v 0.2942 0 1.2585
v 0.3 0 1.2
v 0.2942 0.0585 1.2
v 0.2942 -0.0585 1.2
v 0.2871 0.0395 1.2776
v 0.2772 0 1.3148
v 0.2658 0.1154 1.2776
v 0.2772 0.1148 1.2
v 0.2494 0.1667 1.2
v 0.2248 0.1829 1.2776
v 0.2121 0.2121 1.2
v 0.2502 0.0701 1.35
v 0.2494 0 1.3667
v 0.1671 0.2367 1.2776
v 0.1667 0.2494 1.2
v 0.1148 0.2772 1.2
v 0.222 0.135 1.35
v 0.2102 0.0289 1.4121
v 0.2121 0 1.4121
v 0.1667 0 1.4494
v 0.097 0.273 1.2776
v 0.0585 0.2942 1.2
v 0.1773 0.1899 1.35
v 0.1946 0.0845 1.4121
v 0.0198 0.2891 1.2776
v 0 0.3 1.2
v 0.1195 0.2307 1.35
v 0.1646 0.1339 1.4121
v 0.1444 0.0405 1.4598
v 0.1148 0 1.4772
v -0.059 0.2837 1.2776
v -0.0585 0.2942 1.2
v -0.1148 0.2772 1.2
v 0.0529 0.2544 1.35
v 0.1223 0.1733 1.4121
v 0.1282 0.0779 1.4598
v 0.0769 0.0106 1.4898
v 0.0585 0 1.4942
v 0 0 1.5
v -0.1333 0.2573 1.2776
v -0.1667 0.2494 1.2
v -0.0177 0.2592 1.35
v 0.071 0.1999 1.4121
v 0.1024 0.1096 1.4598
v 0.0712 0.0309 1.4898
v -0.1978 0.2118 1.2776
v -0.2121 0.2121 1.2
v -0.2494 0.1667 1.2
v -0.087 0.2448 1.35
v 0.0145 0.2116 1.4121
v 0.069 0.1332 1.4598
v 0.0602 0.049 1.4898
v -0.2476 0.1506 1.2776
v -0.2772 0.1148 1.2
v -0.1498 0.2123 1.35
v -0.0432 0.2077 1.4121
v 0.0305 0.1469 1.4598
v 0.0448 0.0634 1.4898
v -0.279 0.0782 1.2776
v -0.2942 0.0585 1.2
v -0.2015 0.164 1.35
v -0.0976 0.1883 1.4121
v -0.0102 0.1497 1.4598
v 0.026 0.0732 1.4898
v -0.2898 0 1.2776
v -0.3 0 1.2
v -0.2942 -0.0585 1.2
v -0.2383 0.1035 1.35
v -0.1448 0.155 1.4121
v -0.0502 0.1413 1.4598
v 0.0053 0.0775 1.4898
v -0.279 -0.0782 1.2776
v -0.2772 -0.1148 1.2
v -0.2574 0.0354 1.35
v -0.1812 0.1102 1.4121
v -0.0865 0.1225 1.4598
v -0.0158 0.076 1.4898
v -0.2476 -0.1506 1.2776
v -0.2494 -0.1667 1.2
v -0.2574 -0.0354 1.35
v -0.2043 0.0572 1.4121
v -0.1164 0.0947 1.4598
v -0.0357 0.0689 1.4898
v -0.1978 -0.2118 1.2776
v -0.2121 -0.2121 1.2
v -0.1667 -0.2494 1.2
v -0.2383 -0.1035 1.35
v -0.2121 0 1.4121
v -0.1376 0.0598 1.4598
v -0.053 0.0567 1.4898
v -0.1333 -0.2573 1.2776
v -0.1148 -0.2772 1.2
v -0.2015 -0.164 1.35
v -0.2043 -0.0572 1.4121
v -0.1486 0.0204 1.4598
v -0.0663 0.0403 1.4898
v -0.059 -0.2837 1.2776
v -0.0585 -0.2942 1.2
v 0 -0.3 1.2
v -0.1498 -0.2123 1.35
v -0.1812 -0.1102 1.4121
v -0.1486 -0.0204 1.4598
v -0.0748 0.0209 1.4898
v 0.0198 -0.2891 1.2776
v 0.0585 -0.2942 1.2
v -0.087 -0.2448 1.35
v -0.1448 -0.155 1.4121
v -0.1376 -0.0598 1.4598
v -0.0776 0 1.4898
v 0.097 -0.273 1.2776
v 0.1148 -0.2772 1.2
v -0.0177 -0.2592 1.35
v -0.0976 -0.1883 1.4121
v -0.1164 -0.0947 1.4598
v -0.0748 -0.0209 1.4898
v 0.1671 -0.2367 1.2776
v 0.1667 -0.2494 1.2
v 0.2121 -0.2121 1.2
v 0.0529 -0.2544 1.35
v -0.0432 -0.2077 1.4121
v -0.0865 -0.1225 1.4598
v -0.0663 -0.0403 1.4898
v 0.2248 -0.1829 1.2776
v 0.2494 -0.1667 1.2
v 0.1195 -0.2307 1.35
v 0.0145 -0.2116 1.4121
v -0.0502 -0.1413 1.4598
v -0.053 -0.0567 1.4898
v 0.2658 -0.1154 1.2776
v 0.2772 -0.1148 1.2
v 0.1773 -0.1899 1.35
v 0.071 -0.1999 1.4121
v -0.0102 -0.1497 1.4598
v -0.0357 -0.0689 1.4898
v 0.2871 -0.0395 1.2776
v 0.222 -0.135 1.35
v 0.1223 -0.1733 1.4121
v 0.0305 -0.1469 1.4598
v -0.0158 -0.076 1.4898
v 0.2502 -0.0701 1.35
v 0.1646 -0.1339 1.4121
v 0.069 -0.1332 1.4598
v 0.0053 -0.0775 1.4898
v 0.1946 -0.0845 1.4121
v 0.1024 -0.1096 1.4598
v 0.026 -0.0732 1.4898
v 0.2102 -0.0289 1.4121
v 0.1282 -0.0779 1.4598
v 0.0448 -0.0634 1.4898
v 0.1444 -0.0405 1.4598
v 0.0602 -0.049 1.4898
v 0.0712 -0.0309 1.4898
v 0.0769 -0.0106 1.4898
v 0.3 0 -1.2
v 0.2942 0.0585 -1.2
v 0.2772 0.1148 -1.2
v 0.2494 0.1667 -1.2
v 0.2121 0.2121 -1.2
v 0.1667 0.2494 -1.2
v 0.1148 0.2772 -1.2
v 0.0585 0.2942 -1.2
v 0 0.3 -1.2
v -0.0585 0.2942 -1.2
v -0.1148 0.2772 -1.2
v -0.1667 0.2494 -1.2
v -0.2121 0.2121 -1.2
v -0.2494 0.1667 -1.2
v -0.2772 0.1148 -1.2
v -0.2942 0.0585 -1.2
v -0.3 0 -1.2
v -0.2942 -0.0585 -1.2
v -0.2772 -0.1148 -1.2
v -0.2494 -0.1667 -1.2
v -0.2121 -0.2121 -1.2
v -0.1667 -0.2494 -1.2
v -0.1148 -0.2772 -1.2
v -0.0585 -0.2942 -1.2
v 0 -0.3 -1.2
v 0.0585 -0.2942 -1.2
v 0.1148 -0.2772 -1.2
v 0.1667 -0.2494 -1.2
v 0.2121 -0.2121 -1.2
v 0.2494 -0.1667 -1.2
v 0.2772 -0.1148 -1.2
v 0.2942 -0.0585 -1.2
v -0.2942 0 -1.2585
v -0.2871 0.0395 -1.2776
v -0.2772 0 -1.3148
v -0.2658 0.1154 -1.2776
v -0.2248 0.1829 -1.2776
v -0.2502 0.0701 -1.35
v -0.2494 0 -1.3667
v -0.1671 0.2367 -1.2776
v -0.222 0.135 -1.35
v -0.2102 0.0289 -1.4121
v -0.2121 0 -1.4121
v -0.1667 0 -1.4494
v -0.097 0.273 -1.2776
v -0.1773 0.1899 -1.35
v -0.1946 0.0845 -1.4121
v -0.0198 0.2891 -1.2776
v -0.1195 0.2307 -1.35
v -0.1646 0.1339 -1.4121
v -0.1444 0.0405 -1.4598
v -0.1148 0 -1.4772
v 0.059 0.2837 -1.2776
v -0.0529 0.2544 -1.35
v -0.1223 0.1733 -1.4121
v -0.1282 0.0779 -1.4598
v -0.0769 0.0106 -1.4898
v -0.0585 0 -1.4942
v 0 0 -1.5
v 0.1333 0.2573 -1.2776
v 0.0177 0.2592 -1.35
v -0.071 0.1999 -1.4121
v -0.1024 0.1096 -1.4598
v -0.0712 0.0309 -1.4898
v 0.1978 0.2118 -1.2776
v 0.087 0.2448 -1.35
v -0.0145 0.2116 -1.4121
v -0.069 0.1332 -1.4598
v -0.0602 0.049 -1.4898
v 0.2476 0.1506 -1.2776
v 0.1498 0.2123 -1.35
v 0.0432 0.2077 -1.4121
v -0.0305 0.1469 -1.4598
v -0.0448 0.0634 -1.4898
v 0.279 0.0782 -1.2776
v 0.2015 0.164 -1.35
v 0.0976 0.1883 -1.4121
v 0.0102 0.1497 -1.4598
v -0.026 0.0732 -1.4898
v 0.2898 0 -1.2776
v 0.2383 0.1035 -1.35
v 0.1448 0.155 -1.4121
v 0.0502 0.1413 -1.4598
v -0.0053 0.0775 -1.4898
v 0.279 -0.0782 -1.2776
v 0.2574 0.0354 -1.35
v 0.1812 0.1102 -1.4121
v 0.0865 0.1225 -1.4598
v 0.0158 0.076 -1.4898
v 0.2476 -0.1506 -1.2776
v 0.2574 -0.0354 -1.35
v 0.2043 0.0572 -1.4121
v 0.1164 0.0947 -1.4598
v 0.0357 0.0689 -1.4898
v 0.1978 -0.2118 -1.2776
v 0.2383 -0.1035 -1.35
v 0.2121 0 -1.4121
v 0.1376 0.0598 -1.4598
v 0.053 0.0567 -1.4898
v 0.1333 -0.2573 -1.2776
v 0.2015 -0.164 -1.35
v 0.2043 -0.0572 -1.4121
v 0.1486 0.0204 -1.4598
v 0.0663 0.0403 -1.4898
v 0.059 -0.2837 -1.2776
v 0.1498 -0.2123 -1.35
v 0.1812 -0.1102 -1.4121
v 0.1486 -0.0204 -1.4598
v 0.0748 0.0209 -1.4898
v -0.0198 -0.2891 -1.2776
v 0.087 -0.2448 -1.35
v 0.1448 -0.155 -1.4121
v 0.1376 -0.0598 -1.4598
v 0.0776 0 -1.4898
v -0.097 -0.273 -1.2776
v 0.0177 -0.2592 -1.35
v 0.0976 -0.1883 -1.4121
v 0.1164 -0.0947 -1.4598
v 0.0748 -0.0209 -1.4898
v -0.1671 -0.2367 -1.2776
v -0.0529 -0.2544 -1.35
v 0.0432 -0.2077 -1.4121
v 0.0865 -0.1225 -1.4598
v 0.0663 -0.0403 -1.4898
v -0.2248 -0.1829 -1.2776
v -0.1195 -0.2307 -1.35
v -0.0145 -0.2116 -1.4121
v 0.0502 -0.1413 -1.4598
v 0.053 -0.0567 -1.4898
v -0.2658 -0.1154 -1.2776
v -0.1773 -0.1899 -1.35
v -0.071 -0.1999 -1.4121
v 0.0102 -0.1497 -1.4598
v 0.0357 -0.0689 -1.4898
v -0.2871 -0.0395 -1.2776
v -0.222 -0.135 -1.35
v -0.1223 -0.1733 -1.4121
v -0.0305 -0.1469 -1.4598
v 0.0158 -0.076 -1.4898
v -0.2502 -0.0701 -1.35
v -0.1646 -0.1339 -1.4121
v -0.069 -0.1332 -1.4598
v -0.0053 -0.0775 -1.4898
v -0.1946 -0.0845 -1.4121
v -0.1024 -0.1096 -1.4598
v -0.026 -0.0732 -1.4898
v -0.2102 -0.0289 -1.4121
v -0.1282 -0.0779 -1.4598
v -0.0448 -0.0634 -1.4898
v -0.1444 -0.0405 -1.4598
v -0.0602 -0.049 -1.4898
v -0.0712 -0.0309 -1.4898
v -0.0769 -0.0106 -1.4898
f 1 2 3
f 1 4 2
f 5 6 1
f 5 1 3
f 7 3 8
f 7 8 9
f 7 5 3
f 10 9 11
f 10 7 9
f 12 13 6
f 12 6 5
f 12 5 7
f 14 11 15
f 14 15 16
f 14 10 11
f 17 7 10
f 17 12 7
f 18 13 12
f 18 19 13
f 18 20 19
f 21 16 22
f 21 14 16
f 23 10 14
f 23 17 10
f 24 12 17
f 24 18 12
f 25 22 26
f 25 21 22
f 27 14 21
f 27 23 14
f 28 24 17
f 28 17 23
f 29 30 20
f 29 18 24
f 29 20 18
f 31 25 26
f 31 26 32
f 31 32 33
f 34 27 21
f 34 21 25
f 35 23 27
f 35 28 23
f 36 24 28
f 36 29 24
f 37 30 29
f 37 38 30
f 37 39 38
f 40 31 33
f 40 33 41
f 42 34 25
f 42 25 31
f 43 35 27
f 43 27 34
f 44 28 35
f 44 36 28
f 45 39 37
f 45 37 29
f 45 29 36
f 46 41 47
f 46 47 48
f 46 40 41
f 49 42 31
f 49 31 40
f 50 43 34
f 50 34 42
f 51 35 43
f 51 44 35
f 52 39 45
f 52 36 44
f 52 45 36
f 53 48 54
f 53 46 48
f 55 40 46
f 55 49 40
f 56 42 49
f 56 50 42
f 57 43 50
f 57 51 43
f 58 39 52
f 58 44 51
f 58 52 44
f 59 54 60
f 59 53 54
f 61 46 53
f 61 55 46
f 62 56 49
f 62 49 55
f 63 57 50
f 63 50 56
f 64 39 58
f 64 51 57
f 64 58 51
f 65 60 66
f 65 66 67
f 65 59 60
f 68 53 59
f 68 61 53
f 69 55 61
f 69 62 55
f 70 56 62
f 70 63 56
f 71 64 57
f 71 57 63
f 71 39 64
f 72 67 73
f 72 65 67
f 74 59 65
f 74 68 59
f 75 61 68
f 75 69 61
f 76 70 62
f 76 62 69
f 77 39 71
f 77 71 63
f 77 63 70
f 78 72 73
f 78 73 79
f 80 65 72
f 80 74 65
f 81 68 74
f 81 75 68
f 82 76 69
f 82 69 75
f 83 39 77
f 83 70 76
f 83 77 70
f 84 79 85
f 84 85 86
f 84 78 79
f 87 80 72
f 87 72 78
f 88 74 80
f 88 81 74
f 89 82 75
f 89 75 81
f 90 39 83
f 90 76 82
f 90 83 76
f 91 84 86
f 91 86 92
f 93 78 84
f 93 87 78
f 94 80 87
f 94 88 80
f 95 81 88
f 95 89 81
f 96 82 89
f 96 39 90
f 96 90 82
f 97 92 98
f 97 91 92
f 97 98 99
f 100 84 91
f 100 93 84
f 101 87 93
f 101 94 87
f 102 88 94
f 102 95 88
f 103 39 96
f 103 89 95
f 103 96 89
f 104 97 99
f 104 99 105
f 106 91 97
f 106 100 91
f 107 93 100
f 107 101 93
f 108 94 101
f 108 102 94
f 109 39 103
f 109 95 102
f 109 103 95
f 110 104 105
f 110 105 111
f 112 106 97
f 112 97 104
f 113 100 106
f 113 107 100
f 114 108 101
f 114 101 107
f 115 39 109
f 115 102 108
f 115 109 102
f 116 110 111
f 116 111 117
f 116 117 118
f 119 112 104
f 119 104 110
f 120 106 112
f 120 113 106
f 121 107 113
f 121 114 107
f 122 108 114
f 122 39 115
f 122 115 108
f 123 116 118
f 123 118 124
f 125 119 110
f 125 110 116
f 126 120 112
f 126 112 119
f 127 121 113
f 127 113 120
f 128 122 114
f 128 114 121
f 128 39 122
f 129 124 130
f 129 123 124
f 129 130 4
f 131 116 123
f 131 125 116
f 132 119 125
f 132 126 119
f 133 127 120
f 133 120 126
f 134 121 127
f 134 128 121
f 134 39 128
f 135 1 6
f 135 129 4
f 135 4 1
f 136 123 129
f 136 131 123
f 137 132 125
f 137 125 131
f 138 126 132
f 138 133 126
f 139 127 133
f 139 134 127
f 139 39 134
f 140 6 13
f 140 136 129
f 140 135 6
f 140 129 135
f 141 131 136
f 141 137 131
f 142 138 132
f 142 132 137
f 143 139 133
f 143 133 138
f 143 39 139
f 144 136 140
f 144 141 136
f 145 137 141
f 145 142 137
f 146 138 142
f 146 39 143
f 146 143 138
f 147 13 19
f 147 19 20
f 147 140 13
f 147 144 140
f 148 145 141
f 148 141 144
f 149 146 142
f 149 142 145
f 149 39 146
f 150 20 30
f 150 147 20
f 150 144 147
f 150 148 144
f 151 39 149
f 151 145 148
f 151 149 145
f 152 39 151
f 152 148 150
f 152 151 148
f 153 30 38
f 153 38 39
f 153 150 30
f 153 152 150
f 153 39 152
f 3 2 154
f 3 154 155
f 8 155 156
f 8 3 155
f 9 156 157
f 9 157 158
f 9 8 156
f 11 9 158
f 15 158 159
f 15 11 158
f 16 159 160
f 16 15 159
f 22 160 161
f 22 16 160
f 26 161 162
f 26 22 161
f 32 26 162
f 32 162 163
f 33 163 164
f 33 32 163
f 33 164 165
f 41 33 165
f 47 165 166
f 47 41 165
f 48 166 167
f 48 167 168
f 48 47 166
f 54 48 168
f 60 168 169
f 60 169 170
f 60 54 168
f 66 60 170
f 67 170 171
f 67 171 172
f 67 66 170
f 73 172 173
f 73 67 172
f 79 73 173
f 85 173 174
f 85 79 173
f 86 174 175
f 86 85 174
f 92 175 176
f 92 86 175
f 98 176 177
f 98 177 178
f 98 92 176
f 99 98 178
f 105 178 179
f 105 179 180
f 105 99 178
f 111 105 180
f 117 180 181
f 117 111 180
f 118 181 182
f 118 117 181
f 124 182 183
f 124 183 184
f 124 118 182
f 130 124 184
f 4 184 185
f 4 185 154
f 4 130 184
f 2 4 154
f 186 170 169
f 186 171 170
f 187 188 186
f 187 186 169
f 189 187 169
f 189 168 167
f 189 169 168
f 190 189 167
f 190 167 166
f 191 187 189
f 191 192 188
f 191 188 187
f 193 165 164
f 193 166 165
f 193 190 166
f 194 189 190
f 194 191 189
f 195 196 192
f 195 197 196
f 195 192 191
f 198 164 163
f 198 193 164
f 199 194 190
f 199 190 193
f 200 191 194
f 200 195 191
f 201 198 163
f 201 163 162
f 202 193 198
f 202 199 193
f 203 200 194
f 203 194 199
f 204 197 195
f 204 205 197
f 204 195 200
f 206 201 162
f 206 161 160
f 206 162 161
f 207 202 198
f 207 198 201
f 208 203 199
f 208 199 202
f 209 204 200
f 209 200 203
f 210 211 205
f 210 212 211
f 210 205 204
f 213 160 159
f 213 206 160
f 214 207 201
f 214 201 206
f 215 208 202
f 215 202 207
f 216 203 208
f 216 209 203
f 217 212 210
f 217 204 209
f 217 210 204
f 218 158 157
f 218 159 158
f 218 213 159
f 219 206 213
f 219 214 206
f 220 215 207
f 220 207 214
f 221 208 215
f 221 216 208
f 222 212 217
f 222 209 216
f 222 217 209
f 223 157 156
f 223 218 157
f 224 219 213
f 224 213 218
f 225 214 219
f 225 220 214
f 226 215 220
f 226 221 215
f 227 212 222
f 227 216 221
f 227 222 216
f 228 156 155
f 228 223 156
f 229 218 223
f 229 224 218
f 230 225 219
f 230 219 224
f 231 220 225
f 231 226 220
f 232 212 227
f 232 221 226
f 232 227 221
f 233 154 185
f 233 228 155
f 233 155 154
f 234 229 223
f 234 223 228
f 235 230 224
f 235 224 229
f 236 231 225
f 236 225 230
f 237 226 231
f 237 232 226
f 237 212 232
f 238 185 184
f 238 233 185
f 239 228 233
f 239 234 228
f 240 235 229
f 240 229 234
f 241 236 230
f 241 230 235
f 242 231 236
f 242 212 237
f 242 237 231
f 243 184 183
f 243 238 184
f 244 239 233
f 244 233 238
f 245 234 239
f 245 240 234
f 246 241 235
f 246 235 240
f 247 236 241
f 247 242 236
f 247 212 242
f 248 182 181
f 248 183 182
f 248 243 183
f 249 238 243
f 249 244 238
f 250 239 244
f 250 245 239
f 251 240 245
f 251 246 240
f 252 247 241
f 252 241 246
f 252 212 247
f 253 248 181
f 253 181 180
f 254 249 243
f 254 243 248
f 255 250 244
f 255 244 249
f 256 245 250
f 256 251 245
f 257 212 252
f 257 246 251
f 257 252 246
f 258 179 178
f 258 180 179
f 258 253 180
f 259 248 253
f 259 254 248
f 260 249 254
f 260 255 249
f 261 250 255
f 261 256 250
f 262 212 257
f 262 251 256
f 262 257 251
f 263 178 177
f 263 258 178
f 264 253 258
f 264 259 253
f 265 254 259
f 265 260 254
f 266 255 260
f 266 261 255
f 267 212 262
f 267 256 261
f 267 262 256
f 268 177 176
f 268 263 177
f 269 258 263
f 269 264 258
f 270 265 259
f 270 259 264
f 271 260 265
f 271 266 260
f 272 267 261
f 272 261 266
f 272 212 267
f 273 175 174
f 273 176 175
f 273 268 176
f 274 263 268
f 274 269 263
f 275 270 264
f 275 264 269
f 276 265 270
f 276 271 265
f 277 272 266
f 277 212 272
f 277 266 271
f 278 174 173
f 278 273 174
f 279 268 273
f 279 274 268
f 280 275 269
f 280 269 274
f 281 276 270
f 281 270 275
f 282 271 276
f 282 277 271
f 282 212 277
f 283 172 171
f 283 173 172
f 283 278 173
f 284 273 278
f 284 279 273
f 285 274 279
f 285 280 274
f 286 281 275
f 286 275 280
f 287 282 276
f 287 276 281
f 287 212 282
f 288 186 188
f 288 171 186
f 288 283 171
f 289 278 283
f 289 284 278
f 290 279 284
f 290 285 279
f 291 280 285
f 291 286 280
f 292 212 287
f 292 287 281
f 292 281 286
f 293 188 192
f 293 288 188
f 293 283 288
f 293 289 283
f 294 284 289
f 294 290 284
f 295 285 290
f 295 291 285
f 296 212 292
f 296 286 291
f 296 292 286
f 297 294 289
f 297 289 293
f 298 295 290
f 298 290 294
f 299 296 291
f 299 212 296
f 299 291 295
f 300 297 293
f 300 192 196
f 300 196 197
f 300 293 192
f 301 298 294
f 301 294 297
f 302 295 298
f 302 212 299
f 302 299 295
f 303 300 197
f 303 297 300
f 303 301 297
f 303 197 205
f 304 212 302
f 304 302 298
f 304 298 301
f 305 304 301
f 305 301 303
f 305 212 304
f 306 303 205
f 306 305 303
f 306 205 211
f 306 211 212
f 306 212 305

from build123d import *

# Parameters (mm, degrees)
BASES_R               = 0.3
BASE_DEPTH            = 1.2
FRONTDOME_FACE_RADIUS = 0.3
FRONTDOME_HEIGHT      = 0.3
REARDOME_FACE_RADIUS  = 0.3
REARDOME_HEIGHT       = 0.3


with BuildPart() as part:
    # BaseS → Base (new, symmetric)
    with BuildSketch(Plane.XY):
        Circle(BASES_R)
    extrude(amount=BASE_DEPTH, both=True)

    # FrontDome: a dome of height H over a round flat face of radius A is a cap of a sphere of radius (A * A + H * H) / (2 * H)
    frontdome_r = (FRONTDOME_FACE_RADIUS * FRONTDOME_FACE_RADIUS + FRONTDOME_HEIGHT * FRONTDOME_HEIGHT) / (2 * FRONTDOME_HEIGHT)
    frontdome_base = Plane((0, 0, 1.2), z_dir=(0, 0, 1))
    with Locations(frontdome_base.offset(FRONTDOME_HEIGHT - frontdome_r)):
        frontdome_ball = Sphere(frontdome_r, mode=Mode.PRIVATE)
    add(split(frontdome_ball, bisect_by=frontdome_base, keep=Keep.TOP, mode=Mode.PRIVATE))

    # RearDome: a dome of height H over a round flat face of radius A is a cap of a sphere of radius (A * A + H * H) / (2 * H)
    reardome_r = (REARDOME_FACE_RADIUS * REARDOME_FACE_RADIUS + REARDOME_HEIGHT * REARDOME_HEIGHT) / (2 * REARDOME_HEIGHT)
    reardome_base = Plane((0, 0, -1.2), z_dir=(0, 0, -1))
    with Locations(reardome_base.offset(REARDOME_HEIGHT - reardome_r)):
        reardome_ball = Sphere(reardome_r, mode=Mode.PRIVATE)
    add(split(reardome_ball, bisect_by=reardome_base, keep=Keep.TOP, mode=Mode.PRIVATE))


solid = part.part
